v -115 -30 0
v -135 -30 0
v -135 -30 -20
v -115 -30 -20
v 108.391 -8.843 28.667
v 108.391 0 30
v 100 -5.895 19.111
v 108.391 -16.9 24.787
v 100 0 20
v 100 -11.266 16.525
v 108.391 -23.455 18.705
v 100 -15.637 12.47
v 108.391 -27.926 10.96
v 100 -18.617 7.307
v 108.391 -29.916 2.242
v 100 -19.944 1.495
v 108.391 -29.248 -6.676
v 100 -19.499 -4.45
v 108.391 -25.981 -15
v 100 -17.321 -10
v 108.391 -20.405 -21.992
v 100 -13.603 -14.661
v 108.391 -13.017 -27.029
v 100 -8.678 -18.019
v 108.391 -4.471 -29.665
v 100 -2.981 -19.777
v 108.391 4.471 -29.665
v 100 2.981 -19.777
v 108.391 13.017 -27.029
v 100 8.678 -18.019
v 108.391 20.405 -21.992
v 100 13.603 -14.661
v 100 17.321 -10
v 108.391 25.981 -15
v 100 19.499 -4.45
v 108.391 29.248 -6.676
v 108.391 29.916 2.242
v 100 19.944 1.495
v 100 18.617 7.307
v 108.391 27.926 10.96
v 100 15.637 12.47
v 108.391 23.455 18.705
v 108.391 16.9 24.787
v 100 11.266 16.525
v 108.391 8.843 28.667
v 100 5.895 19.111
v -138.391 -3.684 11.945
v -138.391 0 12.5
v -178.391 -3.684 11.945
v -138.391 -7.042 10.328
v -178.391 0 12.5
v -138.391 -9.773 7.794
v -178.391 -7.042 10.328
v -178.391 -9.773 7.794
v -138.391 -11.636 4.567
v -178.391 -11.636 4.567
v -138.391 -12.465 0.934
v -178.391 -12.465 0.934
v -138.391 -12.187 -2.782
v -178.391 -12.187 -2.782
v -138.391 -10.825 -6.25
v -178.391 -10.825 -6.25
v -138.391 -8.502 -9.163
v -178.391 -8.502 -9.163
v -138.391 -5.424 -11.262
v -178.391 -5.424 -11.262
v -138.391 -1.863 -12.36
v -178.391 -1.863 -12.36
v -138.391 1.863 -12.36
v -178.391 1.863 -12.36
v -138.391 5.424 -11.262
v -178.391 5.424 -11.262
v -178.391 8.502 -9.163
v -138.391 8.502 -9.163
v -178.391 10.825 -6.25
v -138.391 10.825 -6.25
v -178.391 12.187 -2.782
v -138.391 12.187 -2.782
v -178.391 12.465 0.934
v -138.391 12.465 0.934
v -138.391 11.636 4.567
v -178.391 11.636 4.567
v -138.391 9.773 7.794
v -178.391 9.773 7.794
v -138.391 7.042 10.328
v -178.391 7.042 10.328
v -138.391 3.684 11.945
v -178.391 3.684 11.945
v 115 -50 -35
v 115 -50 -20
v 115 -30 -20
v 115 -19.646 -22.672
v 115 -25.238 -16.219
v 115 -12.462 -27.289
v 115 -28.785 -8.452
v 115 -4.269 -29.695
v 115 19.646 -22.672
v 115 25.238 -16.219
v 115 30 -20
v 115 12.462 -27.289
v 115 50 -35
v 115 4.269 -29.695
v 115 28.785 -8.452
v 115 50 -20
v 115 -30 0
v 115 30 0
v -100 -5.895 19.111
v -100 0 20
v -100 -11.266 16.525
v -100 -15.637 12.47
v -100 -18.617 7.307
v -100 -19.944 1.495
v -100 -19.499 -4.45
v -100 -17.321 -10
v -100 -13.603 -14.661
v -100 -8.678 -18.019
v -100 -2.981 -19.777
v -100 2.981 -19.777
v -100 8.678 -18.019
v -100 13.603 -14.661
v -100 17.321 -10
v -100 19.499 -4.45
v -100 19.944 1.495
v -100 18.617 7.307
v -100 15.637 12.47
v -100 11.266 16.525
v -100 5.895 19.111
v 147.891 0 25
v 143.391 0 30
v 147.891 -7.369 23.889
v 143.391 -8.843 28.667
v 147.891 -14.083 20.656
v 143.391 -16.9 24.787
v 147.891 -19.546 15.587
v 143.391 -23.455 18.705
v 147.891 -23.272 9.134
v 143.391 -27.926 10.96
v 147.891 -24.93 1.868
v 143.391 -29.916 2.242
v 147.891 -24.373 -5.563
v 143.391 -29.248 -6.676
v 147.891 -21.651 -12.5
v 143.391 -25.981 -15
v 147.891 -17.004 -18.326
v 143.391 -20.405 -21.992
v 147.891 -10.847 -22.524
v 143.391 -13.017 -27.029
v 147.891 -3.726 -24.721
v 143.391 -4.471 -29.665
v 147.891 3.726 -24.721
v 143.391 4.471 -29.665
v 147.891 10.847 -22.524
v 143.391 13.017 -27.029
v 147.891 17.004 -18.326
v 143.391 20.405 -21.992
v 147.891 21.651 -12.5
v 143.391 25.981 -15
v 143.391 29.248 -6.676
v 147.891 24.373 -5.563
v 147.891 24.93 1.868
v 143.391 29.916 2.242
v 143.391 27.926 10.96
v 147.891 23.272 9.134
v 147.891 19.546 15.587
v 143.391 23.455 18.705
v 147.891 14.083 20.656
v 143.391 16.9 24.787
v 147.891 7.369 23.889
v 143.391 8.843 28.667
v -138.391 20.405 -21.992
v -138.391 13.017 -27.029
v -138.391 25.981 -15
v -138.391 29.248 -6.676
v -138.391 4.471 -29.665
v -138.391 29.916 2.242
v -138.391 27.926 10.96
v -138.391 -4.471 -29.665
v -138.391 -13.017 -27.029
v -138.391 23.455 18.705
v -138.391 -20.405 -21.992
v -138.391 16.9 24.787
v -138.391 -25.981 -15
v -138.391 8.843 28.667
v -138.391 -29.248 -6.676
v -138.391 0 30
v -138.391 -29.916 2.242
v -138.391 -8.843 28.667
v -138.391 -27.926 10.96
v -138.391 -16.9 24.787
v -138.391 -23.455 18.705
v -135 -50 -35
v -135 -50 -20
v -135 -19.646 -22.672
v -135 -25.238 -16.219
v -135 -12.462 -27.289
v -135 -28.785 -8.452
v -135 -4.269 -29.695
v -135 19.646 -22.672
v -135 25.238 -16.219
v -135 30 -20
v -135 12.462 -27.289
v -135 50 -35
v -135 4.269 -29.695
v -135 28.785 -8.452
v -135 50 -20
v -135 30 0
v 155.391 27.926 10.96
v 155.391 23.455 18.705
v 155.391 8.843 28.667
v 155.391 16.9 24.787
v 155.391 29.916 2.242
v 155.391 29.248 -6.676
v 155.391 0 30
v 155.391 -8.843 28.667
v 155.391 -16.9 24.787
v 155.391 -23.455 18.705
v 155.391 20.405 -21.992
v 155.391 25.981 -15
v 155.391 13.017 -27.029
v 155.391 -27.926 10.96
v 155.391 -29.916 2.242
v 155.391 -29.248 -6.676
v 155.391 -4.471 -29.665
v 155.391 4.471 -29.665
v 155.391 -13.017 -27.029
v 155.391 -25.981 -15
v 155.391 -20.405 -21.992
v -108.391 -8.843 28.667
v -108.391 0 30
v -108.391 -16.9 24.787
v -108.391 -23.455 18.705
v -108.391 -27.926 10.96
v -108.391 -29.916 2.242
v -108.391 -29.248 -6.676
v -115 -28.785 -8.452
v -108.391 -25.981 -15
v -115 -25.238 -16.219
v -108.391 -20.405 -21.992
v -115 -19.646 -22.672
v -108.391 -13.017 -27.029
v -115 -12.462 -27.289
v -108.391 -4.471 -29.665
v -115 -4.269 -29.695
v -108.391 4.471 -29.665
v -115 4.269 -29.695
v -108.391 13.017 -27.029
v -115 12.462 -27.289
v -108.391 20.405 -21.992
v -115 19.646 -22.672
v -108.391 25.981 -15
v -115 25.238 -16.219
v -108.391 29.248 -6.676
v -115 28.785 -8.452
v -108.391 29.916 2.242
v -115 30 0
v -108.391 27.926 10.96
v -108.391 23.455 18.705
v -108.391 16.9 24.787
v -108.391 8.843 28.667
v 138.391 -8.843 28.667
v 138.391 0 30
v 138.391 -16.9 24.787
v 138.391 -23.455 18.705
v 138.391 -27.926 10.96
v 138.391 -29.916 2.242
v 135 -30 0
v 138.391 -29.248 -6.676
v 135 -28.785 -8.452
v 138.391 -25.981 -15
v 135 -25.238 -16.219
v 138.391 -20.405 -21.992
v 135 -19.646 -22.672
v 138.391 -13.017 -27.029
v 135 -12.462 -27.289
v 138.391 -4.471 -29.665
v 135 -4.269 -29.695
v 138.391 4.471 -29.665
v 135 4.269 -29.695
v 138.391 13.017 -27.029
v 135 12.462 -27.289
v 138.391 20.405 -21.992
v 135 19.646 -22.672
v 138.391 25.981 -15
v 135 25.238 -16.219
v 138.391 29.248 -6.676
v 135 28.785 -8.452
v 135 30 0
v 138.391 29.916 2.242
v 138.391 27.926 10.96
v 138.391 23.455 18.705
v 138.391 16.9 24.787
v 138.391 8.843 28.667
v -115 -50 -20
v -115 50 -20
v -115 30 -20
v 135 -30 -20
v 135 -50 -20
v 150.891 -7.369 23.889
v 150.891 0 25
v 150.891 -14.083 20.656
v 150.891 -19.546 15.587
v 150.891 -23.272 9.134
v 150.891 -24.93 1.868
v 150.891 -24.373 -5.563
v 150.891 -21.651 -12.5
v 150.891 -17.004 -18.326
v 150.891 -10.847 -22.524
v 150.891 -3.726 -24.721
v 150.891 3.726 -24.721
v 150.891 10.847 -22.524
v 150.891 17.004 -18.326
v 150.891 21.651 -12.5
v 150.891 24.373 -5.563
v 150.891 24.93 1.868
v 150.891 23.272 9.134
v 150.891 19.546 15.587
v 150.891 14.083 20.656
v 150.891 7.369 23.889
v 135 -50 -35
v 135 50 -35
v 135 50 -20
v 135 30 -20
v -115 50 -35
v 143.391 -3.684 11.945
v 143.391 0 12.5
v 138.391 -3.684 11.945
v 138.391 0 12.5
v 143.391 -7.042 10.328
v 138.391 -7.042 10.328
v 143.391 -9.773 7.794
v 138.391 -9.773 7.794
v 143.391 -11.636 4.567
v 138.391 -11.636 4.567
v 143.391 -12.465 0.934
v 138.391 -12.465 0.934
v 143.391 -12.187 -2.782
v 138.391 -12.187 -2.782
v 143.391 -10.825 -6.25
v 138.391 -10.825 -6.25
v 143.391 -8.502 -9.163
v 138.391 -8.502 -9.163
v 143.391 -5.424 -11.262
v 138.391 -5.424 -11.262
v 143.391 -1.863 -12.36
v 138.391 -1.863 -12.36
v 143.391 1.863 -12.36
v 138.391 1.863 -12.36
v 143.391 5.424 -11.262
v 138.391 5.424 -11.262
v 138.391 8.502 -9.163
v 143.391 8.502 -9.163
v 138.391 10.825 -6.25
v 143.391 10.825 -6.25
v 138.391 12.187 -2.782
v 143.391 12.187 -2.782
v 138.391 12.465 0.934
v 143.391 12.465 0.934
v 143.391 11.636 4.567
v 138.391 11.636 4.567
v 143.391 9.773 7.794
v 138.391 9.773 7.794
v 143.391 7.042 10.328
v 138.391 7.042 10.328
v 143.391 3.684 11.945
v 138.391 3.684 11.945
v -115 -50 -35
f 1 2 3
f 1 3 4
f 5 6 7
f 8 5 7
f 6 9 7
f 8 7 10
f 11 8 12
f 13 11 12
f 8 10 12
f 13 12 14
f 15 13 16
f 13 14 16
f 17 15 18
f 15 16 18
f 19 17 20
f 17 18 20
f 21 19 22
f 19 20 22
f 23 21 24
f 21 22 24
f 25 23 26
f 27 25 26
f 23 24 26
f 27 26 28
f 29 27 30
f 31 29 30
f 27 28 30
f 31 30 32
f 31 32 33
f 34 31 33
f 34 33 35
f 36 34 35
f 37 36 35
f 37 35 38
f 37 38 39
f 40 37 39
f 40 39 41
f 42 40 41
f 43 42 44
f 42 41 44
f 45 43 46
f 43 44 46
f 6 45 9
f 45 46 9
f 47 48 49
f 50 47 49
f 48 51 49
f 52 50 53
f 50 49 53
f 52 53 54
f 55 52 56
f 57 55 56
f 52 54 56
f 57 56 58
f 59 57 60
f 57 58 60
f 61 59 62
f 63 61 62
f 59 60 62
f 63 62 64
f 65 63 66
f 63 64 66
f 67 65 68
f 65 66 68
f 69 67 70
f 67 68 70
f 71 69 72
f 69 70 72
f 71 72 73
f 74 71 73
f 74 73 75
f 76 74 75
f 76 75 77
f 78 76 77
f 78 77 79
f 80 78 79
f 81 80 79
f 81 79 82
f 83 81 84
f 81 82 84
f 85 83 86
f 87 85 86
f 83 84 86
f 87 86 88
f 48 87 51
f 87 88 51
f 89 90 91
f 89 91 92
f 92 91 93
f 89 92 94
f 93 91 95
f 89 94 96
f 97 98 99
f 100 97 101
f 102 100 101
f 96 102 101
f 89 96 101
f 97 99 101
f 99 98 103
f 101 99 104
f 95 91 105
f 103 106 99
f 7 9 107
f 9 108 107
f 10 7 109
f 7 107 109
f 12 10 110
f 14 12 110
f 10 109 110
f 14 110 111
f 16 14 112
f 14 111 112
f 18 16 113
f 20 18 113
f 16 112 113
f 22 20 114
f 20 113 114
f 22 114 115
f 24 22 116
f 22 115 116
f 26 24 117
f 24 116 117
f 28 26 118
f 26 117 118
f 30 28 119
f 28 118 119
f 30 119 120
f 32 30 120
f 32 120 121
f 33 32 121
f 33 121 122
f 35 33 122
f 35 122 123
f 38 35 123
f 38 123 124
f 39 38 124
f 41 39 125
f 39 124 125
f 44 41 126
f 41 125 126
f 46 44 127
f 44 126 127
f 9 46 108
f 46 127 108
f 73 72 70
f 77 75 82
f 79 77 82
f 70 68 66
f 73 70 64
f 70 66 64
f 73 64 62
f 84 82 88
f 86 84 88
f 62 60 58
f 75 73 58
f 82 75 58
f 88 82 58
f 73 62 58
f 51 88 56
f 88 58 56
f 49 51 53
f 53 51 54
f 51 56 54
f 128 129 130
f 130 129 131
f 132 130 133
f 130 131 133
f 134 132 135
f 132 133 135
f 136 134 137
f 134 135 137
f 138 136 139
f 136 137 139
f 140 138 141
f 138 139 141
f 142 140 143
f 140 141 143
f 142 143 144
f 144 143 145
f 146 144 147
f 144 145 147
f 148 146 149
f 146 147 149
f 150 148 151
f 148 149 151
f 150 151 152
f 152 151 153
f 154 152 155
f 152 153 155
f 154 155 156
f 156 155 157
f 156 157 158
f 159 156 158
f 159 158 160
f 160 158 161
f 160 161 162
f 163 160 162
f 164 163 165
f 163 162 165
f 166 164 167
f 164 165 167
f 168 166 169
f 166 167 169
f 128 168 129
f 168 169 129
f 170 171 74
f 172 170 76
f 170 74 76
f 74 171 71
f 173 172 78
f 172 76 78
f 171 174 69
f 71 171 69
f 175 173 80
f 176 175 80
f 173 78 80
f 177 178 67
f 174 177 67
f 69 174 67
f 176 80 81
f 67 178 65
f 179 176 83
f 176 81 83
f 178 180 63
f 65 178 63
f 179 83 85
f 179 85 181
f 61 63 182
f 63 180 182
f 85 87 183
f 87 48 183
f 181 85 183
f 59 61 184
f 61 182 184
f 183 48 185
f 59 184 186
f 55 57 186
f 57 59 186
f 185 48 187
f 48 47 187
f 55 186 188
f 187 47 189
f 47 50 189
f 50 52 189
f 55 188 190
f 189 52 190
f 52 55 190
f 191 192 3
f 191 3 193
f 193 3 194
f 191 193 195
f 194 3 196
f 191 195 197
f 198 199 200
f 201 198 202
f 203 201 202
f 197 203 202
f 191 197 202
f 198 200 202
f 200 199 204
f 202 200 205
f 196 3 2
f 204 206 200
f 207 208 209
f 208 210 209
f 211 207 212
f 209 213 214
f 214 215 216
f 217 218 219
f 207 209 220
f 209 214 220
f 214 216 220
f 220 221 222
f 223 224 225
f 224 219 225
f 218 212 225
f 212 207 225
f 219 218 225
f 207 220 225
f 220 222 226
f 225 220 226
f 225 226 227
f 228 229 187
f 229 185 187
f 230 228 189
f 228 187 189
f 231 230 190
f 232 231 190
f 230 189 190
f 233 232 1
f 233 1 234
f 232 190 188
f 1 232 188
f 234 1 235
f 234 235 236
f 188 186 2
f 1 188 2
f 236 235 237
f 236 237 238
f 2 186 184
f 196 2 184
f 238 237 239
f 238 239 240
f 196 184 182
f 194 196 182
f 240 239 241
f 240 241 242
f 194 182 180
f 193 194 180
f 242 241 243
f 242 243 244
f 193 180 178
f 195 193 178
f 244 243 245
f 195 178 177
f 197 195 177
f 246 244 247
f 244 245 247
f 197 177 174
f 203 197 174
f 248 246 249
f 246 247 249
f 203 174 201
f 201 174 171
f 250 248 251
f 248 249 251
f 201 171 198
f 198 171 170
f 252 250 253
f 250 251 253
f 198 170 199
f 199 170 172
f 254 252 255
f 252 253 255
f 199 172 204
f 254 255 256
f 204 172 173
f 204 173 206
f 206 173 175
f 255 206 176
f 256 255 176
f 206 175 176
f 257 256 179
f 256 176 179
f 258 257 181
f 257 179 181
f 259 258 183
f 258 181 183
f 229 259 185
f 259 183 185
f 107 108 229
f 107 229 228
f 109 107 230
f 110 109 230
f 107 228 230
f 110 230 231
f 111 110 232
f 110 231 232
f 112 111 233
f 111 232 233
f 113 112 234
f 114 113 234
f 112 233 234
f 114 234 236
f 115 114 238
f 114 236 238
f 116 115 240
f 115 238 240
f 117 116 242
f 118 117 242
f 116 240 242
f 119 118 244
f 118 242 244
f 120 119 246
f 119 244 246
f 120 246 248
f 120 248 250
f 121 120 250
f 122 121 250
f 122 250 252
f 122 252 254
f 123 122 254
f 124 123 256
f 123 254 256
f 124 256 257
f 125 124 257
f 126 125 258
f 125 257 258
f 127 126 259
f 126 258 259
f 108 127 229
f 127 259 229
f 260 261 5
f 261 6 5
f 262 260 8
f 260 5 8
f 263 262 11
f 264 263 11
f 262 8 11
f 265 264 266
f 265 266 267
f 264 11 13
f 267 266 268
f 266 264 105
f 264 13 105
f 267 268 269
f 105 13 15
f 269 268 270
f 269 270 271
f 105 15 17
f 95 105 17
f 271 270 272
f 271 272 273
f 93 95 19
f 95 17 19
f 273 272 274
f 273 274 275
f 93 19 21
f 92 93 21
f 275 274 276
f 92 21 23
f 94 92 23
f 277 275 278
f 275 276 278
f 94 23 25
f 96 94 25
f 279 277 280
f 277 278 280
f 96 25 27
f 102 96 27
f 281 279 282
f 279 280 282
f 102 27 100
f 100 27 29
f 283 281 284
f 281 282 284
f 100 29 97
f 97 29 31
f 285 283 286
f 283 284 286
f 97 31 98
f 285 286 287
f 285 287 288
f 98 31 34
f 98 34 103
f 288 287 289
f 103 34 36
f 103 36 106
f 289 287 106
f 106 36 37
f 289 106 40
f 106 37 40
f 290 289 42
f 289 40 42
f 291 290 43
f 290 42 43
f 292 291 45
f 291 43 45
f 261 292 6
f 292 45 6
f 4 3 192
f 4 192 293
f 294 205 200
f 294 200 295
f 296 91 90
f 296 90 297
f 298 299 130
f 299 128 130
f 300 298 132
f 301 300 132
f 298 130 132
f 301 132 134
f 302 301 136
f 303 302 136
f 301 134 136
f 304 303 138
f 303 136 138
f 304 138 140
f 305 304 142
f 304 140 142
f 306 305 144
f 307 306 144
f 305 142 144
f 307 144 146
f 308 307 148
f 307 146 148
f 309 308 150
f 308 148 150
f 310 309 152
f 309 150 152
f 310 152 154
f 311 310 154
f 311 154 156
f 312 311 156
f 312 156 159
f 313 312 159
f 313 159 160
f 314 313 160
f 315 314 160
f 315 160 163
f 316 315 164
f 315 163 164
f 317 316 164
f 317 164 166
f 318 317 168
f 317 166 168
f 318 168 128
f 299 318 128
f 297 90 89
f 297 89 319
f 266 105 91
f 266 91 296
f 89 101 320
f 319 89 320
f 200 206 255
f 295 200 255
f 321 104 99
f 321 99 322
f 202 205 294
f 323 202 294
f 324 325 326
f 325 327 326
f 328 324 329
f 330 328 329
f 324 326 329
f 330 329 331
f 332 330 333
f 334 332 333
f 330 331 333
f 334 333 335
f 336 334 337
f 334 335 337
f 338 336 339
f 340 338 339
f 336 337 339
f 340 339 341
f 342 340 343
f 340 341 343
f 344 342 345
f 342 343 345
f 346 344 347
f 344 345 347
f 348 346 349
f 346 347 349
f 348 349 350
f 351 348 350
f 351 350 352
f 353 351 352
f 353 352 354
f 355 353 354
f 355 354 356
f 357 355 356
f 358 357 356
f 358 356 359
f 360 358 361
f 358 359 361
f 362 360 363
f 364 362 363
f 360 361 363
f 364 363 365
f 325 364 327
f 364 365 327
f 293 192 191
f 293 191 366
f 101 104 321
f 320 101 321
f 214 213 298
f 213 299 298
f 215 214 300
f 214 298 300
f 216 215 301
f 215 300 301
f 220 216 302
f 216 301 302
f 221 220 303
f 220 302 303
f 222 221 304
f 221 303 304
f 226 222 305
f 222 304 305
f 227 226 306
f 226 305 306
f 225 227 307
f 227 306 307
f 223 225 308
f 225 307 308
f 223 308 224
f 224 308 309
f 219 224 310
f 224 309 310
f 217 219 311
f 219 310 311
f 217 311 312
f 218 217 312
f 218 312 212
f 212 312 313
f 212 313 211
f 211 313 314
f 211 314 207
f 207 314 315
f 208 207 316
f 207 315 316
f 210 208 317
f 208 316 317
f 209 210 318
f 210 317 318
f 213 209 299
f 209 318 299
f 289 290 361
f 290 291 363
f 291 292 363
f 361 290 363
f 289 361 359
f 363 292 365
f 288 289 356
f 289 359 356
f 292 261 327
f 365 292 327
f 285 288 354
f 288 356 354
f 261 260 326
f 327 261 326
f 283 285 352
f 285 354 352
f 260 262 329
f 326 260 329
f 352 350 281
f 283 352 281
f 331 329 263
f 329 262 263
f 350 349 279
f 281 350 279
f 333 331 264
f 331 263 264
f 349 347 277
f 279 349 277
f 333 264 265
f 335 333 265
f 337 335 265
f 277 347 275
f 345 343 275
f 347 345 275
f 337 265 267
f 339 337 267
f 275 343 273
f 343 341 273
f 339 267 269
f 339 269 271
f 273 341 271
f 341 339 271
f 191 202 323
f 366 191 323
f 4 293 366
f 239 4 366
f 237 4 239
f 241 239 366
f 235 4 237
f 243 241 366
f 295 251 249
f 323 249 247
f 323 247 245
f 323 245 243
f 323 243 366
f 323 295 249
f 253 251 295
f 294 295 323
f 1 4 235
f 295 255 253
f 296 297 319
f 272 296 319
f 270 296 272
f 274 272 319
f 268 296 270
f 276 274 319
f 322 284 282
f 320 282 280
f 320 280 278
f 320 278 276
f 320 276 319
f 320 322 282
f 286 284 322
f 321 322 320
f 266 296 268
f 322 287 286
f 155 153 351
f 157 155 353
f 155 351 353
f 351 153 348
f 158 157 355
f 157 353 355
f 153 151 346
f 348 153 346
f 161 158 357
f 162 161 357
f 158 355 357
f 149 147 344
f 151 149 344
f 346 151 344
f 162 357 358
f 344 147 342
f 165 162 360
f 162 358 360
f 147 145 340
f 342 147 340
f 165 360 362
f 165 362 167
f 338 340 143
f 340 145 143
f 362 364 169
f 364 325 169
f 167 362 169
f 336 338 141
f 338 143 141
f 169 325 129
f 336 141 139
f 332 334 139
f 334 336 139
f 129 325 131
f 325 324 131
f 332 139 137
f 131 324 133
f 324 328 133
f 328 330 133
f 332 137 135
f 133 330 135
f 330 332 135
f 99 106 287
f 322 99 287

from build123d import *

# Parameters (mm, degrees)
F2_W     = 20
F2_H     = 100
F3_DEPTH = 35
F4_W     = 20
F4_H     = 20
F5_DEPTH = 20


with BuildPart() as f1:
    # F0 (on Front) → F1 (revolve)
    with BuildSketch(Plane.XZ):
        Polygon((-108.390996, 30), (-138.390996, 30), (-138.390996, 12.5), (-178.390996, 12.5), (-178.390996, 0), (155.390996, 0), (155.390996, 30), (150.890996, 25), (147.890996, 25), (143.390996, 30), (143.390996, 12.5), (138.390996, 12.5), (138.390996, 30), (108.390996, 30), (100, 20), (-100, 20), align=None)
    revolve(axis=Axis((-3.867105, 0, 0), (1, 0, 0)))

    # F2 (on Top) → F3 (join)
    with BuildSketch(Plane.XY):
        with Locations((-125, 0)):
            Rectangle(F2_W, F2_H)
        with Locations((125, 0)):
            Rectangle(F2_W, F2_H)
    extrude(amount=-F3_DEPTH)

    # F4 (on face) → F5 (cut)
    with BuildSketch(Plane.XY):
        with Locations((-125, 40)):
            Rectangle(F4_W, F4_H)
        with Locations((-125, -40)):
            Rectangle(F4_W, F4_H)
        with Locations((125, -40)):
            Rectangle(F4_W, F4_H)
        with Locations((125, 40)):
            Rectangle(F4_W, F4_H)
    extrude(amount=-F5_DEPTH, mode=Mode.SUBTRACT)


solid = f1.part
